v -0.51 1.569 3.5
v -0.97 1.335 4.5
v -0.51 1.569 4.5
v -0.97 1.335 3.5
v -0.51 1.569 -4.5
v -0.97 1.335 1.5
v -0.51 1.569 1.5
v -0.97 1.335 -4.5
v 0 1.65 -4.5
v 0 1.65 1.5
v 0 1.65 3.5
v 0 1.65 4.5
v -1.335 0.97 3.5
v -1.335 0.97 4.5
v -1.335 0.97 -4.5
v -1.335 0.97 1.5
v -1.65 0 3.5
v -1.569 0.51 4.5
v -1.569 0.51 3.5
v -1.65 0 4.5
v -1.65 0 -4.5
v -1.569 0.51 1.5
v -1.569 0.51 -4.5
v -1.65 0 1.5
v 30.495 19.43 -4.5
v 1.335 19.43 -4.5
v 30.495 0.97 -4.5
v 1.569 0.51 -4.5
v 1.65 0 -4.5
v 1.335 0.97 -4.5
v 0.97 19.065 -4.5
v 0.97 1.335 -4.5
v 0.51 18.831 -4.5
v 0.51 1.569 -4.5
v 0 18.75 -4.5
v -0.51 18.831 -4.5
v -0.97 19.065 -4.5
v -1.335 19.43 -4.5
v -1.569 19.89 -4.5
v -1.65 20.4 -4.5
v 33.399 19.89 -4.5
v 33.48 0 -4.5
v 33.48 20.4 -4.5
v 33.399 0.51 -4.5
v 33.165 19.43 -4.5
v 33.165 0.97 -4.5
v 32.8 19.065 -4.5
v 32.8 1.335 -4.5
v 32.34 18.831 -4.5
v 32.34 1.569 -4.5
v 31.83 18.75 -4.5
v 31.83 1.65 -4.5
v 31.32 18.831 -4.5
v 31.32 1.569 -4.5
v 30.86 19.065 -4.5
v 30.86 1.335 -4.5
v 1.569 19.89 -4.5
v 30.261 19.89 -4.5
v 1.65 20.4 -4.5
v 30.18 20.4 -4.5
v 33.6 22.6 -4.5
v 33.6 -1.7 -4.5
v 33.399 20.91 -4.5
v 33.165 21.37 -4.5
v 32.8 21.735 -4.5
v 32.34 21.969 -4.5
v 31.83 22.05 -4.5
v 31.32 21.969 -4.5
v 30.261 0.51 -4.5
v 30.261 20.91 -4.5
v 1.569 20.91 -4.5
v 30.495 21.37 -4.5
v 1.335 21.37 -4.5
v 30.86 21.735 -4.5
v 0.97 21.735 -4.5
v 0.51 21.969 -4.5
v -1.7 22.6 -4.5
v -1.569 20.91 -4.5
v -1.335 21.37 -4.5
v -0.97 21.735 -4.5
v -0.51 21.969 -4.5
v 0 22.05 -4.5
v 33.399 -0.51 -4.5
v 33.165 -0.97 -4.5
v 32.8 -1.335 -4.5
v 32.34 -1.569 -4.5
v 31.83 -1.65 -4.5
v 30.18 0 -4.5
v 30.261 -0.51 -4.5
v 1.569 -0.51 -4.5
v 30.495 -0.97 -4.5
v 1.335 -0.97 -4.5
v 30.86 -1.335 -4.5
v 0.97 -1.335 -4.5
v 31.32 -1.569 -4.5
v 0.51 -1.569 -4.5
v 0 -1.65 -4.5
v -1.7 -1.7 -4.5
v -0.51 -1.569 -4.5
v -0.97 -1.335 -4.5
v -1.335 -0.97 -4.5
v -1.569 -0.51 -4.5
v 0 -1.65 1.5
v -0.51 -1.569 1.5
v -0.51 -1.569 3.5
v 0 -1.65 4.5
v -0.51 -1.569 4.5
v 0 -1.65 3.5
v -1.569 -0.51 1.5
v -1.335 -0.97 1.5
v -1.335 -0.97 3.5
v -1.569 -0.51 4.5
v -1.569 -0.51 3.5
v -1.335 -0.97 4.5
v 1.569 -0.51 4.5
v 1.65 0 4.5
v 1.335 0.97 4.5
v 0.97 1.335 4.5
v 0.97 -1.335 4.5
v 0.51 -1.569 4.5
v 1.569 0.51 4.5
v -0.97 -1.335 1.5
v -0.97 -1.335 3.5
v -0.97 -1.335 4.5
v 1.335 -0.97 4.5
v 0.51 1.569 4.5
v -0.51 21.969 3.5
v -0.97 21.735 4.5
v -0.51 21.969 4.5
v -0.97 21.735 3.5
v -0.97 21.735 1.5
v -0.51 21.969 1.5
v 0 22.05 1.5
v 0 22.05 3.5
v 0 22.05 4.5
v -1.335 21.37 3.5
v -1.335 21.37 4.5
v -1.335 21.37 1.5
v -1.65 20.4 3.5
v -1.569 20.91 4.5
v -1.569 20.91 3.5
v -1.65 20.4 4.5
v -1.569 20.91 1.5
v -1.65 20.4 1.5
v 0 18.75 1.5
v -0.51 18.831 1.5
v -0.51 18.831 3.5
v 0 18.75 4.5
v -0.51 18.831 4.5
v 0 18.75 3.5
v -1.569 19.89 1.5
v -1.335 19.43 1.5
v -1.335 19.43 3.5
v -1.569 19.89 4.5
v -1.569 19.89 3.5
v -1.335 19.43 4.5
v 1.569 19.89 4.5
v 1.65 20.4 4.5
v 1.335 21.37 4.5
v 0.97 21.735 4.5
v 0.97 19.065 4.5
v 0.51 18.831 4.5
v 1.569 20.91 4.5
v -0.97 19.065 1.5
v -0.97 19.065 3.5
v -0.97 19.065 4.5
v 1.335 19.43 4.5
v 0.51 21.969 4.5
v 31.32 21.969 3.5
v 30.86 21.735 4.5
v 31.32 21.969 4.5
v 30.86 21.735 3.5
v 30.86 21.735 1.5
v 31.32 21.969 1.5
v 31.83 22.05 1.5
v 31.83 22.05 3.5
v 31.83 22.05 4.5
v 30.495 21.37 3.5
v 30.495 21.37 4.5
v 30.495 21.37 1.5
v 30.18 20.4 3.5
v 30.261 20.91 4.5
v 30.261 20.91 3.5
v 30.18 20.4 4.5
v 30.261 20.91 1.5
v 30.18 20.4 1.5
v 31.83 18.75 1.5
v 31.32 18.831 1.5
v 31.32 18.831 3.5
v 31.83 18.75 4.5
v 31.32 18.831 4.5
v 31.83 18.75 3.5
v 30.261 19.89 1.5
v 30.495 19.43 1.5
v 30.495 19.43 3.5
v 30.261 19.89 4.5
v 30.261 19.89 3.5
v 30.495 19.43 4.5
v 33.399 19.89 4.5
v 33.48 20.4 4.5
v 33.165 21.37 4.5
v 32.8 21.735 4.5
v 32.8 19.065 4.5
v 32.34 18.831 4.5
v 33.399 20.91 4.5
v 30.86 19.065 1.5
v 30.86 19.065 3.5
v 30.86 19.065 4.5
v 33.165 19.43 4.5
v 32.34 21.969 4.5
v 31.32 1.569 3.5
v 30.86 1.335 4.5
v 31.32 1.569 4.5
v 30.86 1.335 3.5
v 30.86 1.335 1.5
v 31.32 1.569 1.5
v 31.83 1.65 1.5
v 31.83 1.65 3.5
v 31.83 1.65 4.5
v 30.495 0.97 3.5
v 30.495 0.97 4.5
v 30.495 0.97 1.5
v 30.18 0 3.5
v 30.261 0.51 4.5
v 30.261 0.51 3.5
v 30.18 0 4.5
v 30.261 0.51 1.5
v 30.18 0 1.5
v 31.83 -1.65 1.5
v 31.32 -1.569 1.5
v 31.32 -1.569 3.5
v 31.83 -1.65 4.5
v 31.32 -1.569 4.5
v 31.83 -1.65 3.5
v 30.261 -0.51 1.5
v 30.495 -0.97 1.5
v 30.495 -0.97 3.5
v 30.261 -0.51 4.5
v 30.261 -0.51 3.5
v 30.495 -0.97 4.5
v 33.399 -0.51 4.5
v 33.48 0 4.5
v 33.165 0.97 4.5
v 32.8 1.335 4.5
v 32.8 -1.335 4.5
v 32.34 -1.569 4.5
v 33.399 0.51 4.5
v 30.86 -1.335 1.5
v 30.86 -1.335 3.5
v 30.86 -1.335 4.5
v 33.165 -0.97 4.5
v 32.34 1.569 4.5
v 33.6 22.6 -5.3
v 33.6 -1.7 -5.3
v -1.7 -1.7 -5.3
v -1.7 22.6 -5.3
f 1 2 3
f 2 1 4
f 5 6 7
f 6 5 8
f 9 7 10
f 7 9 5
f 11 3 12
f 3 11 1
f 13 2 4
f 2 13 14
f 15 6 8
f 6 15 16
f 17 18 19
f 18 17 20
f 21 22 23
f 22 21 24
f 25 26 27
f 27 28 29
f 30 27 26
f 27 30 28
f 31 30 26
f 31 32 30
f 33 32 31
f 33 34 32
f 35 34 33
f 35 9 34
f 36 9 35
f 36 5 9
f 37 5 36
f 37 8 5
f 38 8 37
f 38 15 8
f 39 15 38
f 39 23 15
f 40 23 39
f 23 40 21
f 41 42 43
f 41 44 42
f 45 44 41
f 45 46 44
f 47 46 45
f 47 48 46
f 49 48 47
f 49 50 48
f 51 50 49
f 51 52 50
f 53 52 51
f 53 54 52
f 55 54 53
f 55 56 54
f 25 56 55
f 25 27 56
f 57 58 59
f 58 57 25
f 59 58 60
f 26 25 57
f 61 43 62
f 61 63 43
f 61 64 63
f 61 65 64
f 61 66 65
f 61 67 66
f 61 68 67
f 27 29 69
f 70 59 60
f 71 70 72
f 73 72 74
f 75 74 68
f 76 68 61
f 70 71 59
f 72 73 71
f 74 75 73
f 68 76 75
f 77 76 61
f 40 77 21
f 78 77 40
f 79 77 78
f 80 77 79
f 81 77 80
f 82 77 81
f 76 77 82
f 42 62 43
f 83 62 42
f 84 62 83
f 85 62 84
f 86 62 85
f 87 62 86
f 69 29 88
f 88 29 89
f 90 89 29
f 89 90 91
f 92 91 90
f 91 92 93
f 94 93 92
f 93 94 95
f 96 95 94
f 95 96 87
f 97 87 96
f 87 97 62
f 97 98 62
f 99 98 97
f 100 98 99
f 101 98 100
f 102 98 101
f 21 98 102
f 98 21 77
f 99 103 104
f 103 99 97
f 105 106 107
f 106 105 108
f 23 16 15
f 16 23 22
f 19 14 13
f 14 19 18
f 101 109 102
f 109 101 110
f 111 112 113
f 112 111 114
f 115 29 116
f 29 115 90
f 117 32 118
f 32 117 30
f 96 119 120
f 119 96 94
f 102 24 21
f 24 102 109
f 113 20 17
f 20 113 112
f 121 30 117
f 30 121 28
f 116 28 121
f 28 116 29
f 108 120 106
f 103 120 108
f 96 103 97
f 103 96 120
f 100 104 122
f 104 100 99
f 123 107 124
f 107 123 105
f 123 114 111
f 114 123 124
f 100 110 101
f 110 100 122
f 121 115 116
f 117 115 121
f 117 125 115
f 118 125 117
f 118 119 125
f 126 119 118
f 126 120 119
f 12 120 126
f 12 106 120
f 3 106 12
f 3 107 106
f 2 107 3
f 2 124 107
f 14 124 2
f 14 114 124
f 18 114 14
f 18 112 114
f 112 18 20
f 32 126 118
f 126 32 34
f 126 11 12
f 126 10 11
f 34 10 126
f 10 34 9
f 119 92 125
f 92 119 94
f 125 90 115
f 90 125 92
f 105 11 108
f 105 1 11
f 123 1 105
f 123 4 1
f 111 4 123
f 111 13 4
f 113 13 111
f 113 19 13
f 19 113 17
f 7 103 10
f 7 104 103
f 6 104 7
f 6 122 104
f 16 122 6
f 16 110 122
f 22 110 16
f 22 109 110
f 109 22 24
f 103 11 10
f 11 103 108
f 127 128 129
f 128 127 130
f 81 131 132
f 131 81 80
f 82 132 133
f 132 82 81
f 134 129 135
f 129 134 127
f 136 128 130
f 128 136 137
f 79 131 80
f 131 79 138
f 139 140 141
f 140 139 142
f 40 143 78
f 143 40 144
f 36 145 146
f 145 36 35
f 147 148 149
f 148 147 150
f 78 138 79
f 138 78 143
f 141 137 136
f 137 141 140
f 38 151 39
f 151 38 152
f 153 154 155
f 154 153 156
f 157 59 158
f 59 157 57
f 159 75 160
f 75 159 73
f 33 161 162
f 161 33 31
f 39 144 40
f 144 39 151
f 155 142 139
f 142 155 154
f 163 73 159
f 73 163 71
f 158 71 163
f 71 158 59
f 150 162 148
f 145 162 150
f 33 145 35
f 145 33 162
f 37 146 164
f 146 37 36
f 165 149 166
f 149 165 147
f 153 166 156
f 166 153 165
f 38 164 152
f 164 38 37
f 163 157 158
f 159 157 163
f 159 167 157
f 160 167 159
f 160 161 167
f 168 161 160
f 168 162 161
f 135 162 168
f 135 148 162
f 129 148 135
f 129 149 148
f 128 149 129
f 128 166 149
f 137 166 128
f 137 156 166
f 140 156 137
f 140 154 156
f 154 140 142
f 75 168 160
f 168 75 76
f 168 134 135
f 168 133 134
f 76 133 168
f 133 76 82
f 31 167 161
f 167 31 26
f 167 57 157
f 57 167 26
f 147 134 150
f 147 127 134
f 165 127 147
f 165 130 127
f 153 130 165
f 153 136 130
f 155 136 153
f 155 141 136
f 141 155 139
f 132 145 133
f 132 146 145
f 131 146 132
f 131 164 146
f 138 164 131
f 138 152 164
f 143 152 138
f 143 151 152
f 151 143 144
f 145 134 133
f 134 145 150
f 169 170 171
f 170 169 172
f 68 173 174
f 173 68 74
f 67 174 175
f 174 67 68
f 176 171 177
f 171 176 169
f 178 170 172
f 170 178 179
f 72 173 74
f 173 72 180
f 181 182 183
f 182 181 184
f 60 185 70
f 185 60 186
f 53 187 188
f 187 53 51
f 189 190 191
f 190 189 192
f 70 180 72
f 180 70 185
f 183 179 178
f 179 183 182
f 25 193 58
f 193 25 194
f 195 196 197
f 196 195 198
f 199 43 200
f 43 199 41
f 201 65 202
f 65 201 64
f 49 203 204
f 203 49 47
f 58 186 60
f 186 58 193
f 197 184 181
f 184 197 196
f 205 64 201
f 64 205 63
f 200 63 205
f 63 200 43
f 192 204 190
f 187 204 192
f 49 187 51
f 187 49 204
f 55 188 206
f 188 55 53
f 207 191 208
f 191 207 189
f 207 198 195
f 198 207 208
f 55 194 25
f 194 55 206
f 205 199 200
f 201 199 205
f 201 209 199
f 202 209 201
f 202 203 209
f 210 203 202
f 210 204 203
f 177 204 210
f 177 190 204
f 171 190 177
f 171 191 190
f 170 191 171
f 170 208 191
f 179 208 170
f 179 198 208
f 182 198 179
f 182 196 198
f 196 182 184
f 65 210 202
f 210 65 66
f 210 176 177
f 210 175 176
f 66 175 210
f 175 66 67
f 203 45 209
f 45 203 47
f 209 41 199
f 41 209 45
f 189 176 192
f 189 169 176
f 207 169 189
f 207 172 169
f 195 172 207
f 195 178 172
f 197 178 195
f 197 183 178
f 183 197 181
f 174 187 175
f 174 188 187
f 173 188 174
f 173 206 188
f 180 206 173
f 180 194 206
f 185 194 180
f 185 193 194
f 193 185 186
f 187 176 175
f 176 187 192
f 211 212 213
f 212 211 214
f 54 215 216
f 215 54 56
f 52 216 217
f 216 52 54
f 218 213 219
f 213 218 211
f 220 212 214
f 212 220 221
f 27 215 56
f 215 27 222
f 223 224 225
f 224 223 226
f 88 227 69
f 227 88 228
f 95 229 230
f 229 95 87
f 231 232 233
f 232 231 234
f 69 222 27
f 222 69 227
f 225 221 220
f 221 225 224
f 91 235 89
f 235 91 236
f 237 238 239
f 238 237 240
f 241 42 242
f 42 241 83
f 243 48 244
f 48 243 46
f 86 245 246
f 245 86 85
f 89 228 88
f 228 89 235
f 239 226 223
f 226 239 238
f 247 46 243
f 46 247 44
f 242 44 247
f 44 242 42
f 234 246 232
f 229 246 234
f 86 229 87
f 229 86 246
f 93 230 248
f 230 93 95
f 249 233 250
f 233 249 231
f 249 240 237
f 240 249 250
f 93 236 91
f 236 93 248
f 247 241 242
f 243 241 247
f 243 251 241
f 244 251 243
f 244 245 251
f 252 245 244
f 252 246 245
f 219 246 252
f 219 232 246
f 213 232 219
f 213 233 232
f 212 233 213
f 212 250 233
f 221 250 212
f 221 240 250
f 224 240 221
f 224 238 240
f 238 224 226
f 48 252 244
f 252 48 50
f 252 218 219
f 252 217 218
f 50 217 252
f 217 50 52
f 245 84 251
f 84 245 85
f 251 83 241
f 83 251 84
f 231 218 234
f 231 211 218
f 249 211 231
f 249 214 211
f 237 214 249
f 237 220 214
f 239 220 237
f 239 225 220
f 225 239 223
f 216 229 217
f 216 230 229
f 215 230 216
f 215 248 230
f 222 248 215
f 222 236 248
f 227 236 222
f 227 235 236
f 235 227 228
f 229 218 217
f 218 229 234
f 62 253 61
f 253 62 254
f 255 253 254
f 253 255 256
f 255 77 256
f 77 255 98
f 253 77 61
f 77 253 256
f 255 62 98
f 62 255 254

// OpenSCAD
// file: ../parts/hanger_peg.scad
// Hook pegs, cylinder with a notch
module hanger_peg(h=10,d=3.3,notch=2,lip=1) {
  assert(h >= notch + lip, "Height must be larger than notch and lip");
  difference() {
    cylinder(d=d, h=h, center=true);
    translate([0, d/2, h/2 - notch/2 - lip]) {
      cube(size=[d+1, d, notch], center=true);
    }
  }
}
hanger_peg(h=5,$fn=20);
// main file
// SparkFun Thing Hanger

/*
    *        *
    |        |
    +--------+
*/
$fn=20;
extruder_width = 0.4;
wall_thickness = 2*extruder_width;

use <../parts/hanger_peg.scad>;

// hanger_peg(h=5);

peg_locations = [
  [0, 0, 0],
  [0, 20.4, 0],
  [31.83, 20.4, 0],
  [31.83, 0, 0],
];

for(p = peg_locations) {
  translate(p) {
    rotate([0, 0, 90]) {
      hanger_peg(h=9, d=3.3);
    }
  }
}
translate([-1.7, -1.7, -(9/2 + wall_thickness)]) {
  cube([35.3, 24.3, wall_thickness]);
}
